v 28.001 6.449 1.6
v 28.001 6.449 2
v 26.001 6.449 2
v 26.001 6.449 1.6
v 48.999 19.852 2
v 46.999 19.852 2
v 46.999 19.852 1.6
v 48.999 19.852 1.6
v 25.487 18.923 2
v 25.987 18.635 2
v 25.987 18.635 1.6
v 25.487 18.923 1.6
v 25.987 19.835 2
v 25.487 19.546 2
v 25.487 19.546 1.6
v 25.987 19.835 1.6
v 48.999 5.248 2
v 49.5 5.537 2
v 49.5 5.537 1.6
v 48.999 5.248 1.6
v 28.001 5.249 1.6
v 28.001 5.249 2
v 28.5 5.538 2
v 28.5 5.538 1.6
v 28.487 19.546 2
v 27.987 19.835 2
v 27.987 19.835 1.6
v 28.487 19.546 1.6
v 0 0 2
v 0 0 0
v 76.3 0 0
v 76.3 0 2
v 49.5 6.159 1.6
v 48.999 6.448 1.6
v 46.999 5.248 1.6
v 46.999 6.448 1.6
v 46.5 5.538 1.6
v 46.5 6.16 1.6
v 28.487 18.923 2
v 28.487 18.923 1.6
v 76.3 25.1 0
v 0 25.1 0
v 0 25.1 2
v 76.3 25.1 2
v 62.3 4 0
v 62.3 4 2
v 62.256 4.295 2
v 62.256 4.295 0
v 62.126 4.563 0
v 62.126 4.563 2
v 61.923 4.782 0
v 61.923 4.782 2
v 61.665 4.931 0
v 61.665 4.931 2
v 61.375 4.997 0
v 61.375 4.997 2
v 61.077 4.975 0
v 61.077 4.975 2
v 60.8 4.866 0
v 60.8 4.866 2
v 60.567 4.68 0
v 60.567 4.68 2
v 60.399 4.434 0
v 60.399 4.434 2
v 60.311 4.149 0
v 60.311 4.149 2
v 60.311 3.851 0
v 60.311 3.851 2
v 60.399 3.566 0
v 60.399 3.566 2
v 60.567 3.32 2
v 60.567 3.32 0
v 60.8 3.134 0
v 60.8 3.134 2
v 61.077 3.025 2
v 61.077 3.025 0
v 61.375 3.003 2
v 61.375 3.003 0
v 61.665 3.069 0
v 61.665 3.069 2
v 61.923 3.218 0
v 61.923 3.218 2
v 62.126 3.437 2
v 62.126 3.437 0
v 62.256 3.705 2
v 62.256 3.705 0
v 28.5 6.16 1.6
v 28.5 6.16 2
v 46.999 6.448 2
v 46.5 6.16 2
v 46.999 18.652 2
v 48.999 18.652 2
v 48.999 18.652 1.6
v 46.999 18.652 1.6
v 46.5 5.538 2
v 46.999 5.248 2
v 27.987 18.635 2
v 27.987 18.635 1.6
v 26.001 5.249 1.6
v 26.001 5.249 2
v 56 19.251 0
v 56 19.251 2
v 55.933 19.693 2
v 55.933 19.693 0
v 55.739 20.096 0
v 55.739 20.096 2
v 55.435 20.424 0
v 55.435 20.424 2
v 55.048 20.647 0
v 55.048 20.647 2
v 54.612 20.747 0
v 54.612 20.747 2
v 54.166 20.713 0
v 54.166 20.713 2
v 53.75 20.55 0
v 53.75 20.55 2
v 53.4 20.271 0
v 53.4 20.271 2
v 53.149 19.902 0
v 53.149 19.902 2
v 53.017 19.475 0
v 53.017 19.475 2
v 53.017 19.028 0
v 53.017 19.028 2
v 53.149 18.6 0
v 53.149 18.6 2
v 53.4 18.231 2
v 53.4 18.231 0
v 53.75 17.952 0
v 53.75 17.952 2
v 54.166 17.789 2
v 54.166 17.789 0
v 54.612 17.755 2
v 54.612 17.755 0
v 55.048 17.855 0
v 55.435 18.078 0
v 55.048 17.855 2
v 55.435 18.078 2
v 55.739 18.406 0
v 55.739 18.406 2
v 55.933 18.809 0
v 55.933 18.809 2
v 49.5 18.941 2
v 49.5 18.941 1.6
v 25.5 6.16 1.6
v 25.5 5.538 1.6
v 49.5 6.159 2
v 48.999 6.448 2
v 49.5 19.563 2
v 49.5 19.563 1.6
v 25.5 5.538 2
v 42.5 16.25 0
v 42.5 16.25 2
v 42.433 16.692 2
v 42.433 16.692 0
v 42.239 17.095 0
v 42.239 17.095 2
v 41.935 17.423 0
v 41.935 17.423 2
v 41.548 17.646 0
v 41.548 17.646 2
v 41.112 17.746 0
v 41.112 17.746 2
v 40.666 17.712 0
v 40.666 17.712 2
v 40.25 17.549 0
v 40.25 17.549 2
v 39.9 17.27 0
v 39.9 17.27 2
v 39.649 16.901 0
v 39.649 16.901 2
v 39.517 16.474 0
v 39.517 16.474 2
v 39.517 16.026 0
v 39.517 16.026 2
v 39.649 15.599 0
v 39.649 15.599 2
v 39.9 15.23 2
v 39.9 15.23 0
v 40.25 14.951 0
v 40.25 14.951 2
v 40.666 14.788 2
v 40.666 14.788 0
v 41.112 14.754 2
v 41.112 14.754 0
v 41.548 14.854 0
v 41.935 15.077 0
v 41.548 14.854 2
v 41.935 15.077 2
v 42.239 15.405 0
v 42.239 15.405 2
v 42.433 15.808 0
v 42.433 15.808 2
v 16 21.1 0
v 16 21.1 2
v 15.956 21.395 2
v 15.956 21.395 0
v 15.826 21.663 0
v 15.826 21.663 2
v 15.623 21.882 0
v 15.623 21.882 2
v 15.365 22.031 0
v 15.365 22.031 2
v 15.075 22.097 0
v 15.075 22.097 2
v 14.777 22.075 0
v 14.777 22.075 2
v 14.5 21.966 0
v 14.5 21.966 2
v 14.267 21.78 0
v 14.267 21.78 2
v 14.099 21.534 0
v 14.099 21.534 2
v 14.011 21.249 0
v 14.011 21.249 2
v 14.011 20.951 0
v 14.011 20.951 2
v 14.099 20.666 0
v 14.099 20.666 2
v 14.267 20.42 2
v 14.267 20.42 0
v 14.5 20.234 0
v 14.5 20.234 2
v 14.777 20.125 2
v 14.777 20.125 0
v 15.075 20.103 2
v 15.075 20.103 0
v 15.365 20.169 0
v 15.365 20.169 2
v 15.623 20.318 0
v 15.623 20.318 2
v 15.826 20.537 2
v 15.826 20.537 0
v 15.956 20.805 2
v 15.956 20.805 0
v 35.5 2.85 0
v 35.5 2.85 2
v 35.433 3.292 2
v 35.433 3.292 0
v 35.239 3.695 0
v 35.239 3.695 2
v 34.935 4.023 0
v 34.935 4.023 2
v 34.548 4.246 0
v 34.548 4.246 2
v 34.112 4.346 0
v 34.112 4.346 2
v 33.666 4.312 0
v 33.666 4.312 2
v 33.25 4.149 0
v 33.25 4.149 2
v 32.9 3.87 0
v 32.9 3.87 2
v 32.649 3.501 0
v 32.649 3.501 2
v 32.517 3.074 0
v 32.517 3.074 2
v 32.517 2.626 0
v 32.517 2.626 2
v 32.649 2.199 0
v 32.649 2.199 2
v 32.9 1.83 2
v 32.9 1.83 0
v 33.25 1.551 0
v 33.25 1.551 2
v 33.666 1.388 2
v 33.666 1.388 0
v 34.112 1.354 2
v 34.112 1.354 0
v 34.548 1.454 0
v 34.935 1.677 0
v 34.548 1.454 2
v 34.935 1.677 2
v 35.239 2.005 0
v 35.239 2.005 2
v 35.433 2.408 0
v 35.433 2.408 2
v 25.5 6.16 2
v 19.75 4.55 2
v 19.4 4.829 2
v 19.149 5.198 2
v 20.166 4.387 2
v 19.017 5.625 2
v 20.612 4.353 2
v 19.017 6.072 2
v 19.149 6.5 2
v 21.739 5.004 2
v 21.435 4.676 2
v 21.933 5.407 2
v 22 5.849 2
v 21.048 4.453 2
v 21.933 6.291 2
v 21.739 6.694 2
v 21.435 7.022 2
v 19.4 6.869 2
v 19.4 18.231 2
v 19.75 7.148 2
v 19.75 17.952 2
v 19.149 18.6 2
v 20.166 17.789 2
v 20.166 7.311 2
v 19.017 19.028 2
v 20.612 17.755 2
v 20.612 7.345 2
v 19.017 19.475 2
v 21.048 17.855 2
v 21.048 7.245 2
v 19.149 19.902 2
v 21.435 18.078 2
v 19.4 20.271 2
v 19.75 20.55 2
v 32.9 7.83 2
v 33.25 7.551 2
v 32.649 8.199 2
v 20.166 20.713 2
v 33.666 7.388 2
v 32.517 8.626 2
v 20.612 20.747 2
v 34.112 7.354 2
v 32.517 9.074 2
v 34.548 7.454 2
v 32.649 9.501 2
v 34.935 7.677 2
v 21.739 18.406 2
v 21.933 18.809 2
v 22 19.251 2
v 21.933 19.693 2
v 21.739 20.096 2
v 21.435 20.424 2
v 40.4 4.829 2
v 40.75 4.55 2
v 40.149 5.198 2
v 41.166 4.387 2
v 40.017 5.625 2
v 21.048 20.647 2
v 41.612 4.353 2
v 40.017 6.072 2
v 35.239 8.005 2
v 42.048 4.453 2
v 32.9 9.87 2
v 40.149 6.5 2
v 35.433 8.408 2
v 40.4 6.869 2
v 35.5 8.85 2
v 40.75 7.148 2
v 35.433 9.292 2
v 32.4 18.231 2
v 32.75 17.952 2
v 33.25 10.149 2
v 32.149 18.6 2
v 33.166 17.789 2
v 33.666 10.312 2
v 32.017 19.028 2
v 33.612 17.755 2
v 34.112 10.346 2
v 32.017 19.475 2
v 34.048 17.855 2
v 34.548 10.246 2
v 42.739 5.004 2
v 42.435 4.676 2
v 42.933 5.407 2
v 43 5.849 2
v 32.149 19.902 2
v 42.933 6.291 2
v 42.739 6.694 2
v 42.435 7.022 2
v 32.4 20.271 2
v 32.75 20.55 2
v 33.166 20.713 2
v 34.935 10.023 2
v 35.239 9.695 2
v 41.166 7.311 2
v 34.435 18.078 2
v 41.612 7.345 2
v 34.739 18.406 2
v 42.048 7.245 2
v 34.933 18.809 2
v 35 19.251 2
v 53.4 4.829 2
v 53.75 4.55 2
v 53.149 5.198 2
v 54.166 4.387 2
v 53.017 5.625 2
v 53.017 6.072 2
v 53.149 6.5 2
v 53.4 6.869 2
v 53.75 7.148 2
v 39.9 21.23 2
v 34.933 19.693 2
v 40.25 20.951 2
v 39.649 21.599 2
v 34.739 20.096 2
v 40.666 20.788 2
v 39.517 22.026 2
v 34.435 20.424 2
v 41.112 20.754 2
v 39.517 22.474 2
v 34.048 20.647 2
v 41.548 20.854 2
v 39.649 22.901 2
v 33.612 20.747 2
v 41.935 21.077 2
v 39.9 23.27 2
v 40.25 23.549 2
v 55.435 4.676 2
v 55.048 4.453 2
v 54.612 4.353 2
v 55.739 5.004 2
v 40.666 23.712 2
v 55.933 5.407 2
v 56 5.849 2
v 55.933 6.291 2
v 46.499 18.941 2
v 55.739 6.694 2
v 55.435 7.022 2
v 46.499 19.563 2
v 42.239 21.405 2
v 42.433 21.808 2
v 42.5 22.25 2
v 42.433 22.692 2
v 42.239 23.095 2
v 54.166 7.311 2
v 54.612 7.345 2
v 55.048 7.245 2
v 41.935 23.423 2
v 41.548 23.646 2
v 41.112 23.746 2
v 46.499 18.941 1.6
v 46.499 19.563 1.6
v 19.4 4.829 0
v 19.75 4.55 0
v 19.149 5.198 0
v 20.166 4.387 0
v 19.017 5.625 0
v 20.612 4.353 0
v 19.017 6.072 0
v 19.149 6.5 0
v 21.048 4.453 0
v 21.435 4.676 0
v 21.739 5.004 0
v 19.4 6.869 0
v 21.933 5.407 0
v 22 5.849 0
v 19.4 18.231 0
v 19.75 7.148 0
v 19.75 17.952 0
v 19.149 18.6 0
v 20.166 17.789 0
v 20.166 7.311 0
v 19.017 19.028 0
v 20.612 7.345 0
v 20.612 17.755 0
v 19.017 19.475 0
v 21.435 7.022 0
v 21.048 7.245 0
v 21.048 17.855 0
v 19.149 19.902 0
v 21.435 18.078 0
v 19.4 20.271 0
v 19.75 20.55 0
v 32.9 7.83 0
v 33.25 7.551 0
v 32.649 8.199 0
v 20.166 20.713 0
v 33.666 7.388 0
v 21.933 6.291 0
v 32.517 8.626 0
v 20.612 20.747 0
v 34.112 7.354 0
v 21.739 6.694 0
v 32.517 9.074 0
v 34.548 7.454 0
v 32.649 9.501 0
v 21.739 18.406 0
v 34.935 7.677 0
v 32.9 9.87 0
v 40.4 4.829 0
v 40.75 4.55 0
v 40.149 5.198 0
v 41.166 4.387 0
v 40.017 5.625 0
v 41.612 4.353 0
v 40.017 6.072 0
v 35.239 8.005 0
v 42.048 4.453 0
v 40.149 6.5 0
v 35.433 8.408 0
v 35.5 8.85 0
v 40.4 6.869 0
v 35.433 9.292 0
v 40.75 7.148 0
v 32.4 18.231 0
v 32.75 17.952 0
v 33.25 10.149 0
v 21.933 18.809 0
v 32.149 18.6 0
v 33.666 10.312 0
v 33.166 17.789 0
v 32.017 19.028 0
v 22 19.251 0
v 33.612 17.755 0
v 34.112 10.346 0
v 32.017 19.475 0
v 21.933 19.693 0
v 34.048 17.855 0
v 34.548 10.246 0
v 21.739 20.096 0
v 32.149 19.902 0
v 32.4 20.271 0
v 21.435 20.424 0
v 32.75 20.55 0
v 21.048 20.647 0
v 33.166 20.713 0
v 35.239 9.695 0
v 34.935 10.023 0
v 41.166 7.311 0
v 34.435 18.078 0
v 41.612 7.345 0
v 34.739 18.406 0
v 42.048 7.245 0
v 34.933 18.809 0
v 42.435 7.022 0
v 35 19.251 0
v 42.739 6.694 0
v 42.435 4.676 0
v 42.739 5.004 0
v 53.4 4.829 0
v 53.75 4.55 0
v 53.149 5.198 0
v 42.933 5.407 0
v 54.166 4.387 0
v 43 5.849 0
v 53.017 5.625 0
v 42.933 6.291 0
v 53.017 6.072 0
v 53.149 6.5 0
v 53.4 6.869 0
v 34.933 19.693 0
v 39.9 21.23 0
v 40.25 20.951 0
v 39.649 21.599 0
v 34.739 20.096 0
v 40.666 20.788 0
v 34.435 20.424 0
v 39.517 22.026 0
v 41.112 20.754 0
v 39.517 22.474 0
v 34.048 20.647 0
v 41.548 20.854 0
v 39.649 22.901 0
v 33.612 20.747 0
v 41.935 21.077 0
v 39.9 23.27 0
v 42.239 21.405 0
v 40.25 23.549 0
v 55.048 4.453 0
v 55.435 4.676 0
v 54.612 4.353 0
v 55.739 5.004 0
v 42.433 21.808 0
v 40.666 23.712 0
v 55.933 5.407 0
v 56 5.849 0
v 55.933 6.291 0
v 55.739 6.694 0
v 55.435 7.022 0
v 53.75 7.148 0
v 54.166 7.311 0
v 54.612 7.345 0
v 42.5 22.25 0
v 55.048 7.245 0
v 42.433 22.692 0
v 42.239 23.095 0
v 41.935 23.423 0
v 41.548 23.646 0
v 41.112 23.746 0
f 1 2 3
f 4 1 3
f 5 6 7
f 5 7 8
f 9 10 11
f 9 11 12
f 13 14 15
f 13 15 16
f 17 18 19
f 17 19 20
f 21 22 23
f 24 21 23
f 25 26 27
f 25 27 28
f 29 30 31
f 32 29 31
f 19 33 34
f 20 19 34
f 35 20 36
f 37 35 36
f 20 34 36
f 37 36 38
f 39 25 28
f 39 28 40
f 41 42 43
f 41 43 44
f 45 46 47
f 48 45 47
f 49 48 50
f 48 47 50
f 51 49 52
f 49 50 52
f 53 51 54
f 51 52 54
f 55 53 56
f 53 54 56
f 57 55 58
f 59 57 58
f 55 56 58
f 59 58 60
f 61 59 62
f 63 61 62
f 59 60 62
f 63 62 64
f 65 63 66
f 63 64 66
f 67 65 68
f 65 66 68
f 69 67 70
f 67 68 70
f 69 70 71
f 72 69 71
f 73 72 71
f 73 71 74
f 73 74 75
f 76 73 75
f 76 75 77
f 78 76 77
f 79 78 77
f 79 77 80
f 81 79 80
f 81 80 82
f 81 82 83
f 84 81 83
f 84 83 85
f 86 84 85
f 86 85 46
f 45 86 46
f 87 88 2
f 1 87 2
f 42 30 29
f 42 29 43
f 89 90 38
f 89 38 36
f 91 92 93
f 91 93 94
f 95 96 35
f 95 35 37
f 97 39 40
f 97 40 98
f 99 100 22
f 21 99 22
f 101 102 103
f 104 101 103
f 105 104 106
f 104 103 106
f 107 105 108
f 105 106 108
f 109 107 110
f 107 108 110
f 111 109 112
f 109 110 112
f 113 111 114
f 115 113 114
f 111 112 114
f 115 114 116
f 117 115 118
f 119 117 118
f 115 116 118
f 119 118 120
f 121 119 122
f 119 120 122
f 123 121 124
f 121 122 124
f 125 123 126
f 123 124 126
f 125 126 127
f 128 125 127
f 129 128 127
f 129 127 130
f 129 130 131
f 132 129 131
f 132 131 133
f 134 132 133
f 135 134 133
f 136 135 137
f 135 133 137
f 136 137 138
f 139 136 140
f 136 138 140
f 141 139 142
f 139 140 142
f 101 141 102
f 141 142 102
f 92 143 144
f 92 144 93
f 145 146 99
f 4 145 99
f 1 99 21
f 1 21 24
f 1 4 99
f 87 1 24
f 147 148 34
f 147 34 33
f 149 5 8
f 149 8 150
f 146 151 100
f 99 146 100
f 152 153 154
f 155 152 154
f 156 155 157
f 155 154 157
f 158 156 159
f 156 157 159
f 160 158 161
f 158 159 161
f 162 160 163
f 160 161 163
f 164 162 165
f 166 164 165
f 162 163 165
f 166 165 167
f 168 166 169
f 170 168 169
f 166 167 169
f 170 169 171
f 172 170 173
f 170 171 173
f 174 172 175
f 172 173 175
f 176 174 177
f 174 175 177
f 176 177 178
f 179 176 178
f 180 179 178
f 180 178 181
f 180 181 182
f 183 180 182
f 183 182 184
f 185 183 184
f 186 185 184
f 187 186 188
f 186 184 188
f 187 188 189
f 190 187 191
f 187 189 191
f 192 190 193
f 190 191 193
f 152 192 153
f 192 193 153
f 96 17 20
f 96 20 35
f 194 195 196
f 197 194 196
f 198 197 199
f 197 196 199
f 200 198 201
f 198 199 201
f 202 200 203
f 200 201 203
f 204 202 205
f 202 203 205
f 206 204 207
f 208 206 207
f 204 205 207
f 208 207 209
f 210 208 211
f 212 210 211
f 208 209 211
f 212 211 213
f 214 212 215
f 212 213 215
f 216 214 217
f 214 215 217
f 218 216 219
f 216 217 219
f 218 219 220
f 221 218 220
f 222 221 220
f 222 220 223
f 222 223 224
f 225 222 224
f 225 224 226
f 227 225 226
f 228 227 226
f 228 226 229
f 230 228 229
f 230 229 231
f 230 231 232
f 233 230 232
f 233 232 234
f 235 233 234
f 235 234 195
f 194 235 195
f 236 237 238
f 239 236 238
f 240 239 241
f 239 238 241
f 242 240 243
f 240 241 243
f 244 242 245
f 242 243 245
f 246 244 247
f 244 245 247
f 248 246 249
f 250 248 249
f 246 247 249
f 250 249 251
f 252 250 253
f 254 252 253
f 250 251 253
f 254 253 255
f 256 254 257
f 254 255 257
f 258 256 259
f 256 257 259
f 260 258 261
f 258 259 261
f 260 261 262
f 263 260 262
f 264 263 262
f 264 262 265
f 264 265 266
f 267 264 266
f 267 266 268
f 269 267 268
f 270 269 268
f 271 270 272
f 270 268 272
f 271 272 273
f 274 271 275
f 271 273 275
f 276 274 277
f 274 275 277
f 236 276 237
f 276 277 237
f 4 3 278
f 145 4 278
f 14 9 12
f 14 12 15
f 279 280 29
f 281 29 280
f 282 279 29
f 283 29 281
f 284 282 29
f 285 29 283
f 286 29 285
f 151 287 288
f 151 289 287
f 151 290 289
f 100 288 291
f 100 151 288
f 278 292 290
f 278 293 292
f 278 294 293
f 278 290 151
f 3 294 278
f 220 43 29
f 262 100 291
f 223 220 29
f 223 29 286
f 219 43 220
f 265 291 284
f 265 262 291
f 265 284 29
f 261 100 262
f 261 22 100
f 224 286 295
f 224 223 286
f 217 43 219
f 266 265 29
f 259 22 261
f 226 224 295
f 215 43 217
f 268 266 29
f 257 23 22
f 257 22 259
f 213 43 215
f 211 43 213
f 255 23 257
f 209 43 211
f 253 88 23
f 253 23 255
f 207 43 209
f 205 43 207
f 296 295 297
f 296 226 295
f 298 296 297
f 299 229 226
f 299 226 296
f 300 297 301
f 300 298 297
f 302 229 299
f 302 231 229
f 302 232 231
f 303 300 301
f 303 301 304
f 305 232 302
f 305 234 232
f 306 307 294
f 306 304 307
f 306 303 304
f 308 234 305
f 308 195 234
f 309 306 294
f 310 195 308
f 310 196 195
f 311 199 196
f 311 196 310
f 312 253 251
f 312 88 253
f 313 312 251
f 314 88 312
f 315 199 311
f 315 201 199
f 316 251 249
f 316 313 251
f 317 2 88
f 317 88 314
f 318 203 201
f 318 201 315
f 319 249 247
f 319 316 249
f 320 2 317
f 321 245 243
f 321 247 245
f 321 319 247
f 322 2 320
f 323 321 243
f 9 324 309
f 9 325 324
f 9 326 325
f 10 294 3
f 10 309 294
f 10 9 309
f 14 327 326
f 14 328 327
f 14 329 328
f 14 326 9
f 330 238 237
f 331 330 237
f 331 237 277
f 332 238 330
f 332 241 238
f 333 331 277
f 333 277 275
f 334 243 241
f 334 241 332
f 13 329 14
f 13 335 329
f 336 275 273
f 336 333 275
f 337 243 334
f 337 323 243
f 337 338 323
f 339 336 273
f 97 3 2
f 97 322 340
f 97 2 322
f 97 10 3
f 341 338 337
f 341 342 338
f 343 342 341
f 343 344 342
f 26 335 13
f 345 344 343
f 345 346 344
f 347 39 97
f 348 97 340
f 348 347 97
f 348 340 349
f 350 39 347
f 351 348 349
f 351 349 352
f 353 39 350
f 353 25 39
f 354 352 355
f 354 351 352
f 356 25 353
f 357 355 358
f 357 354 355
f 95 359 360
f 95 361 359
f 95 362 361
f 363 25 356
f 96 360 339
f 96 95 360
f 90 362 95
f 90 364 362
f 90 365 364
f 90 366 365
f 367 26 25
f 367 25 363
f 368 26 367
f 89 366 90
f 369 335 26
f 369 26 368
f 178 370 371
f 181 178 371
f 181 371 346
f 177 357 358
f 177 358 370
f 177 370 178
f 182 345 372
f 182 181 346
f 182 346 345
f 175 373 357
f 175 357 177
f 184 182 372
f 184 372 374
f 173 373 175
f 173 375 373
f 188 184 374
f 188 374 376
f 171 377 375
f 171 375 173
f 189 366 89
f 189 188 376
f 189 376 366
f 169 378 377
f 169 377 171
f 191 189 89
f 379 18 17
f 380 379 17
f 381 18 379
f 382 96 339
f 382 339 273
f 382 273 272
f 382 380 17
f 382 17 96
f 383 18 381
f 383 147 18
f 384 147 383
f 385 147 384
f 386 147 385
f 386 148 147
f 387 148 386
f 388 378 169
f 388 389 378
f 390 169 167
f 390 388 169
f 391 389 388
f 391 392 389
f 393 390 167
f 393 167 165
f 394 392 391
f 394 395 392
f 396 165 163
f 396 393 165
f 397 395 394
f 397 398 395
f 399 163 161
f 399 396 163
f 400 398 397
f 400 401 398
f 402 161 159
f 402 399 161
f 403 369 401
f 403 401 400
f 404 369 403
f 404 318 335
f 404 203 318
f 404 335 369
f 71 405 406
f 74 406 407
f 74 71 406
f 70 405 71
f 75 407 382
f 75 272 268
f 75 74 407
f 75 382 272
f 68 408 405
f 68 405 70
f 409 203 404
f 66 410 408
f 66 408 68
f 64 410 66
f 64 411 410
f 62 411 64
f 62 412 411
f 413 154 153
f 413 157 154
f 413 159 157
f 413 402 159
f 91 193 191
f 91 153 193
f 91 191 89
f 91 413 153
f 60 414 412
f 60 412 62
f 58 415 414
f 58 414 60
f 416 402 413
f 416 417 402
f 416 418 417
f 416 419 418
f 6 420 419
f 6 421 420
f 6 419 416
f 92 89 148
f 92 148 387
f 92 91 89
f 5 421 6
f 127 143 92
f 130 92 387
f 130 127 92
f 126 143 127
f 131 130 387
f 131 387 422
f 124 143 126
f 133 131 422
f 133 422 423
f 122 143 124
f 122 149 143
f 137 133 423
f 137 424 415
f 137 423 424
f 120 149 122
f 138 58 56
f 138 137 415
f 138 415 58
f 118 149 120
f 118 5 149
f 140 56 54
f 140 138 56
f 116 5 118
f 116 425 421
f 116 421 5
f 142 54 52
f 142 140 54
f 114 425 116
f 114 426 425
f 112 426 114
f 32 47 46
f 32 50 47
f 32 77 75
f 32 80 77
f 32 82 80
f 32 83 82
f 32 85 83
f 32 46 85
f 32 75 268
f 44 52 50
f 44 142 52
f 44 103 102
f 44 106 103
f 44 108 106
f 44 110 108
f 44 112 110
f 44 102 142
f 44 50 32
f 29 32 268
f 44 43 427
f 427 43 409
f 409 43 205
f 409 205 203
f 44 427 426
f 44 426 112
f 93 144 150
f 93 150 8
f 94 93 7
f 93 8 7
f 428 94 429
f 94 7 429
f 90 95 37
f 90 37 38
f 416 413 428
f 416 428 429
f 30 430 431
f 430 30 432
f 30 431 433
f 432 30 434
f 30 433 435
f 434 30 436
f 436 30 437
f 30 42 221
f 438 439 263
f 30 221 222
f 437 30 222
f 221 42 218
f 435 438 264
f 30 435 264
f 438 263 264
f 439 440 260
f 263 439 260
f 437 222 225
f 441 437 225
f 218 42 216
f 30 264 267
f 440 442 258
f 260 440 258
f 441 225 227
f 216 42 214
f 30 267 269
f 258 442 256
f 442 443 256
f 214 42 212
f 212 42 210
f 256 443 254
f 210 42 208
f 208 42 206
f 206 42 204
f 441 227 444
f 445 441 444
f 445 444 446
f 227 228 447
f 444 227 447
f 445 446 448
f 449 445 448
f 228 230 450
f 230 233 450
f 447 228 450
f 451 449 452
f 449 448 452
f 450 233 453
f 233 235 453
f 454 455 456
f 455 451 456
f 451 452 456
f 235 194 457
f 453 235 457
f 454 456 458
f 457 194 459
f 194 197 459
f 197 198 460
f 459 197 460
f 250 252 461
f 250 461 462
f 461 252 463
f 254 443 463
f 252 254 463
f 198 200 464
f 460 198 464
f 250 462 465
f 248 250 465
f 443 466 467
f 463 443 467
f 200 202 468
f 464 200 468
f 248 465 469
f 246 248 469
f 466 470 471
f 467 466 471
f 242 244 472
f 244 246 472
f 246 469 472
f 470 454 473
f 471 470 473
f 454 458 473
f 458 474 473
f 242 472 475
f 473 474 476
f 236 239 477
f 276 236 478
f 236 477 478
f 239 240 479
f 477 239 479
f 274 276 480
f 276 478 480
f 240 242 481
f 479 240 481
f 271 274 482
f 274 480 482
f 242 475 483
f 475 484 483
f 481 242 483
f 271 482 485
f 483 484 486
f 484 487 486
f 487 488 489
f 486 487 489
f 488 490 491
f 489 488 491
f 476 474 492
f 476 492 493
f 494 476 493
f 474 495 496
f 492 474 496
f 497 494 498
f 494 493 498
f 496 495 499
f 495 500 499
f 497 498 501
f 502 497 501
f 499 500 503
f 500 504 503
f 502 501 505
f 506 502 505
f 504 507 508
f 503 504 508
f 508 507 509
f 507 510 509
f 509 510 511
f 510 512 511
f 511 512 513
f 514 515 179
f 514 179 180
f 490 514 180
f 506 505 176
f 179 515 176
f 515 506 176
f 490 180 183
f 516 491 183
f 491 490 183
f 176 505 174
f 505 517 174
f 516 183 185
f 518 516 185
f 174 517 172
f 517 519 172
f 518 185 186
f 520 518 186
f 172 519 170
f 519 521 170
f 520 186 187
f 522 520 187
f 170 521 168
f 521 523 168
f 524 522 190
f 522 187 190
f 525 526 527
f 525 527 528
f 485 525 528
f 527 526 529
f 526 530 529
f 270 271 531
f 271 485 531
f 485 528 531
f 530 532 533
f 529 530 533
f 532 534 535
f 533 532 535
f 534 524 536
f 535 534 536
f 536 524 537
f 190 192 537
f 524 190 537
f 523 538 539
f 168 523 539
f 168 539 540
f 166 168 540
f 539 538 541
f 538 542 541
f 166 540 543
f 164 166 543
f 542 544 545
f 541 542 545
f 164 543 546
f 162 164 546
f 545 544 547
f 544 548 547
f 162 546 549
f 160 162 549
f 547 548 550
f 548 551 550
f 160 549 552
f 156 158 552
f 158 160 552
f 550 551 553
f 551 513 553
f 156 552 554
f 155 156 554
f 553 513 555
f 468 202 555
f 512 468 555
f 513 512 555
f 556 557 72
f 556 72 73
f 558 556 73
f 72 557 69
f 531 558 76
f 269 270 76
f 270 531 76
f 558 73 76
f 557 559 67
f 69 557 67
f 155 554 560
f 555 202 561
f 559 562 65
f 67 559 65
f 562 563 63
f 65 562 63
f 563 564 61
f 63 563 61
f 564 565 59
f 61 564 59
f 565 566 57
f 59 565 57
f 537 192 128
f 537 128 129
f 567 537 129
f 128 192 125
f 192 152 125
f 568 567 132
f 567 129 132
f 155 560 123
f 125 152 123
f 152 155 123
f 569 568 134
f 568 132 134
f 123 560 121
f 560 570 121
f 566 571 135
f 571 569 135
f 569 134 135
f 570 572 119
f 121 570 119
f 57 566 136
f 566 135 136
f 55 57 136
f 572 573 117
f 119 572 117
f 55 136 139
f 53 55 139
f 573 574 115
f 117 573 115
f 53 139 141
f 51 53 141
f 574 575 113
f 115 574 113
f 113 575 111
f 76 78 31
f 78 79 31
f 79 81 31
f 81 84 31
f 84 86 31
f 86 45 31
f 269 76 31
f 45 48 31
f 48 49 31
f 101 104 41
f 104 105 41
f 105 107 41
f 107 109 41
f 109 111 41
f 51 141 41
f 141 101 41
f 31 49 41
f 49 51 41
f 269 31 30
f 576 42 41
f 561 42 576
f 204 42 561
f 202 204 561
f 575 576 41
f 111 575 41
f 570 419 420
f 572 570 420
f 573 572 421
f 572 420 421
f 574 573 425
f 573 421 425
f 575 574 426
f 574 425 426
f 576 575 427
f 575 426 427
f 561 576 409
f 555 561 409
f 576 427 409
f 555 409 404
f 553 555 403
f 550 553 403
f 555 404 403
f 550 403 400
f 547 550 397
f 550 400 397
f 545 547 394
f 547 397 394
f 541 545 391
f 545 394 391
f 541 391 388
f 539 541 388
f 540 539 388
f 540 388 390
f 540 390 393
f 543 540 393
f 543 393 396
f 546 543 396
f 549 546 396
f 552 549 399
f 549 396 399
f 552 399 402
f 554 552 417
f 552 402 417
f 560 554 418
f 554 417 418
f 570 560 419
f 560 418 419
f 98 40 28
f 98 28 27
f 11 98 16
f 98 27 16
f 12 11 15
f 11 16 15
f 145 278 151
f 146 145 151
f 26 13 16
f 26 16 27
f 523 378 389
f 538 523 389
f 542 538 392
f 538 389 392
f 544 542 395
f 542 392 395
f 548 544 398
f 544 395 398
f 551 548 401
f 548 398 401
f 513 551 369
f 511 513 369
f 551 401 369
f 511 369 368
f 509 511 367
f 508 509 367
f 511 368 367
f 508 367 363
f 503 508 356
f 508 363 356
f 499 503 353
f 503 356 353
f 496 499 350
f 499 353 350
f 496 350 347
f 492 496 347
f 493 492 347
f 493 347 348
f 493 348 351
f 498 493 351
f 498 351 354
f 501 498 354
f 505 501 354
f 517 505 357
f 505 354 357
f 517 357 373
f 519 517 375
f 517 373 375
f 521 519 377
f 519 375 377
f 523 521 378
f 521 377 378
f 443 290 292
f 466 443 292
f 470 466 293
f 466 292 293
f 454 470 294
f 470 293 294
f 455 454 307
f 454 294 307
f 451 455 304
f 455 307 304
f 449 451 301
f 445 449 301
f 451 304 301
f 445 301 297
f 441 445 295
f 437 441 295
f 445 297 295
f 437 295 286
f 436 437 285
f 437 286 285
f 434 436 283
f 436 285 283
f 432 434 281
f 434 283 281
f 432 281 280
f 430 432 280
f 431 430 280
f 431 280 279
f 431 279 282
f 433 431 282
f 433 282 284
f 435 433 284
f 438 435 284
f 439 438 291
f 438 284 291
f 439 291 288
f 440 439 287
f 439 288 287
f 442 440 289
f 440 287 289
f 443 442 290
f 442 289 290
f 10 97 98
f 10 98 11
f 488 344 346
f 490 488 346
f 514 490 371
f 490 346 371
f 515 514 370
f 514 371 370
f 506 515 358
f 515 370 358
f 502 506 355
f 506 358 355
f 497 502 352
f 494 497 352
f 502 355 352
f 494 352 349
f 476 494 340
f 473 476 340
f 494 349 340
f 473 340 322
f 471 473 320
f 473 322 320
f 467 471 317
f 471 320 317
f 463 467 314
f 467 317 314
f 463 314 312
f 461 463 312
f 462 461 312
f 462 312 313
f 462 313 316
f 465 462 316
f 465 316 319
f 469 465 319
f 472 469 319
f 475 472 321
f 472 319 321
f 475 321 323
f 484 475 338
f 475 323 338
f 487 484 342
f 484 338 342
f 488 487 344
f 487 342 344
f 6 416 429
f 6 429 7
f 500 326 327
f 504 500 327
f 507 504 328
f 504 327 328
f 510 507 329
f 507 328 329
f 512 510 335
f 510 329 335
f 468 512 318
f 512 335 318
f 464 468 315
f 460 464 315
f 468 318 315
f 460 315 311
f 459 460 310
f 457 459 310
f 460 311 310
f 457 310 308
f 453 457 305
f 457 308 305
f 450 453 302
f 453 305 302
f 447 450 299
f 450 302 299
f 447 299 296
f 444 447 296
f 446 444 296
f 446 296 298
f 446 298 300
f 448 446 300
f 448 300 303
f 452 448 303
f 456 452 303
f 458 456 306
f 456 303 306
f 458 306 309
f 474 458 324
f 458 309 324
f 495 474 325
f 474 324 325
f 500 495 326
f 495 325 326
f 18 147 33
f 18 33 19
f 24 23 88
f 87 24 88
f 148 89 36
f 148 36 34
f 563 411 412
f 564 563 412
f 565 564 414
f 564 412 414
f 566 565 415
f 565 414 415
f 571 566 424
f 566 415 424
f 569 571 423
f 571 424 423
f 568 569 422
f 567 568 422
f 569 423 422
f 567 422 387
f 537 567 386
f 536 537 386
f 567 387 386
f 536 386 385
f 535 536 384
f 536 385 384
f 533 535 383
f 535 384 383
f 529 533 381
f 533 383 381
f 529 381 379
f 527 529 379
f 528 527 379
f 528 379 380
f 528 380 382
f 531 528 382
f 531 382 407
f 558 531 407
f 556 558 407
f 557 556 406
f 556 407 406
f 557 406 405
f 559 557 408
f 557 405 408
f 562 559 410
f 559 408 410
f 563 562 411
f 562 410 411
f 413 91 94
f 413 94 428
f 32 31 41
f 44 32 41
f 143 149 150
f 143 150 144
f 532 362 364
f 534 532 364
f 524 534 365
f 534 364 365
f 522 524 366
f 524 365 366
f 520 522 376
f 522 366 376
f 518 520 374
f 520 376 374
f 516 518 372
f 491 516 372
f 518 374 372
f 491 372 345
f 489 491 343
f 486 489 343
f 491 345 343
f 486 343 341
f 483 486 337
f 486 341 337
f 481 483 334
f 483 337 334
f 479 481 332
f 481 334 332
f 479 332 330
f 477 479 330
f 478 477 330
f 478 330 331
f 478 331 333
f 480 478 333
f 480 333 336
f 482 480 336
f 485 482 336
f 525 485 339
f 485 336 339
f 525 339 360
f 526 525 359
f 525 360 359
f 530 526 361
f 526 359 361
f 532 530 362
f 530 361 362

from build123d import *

# Parameters (mm, degrees)
SKETCH1_W           = 76.3
SKETCH1_H           = 25.1
BOSS_EXTRUDE1_DEPTH = 2
SKETCH3_R           = 1
CUT_EXTRUDE2_DEPTH  = 10
SKETCH10_R          = 1.5
CUT_EXTRUDE8_DEPTH  = 2
CUT_EXTRUDE10_DEPTH = 0.4


with BuildPart() as part:
    # Sketch1 → Boss-Extrude1 (new body)
    with BuildSketch(Plane.XY):
        with Locations((38.15, 12.55)):
            Rectangle(SKETCH1_W, SKETCH1_H)
    extrude(amount=BOSS_EXTRUDE1_DEPTH)

    # Sketch3 → Cut-Extrude2 (cut)
    with BuildSketch(Plane.XY.offset(2)):
        with Locations((15, 21.1)):
            Circle(SKETCH3_R)
        with Locations((61.3, 4)):
            Circle(SKETCH3_R)
    extrude(amount=-CUT_EXTRUDE2_DEPTH, mode=Mode.SUBTRACT)

    # Sketch10 → Cut-Extrude8 (cut)
    with BuildSketch(Plane.XY.offset(2)):
        with Locations((20.5, 19.25108338)):
            Circle(SKETCH10_R)
        with Locations((20.5, 5.84891662)):
            Circle(SKETCH10_R)
        with Locations((54.5, 5.84891662)):
            Circle(SKETCH10_R)
        with Locations((54.5, 19.25108338)):
            Circle(SKETCH10_R)
        with Locations((33.5, 19.25108338)):
            Circle(SKETCH10_R)
        with Locations((41.5, 5.84891662)):
            Circle(SKETCH10_R)
        with Locations((34, 2.85)):
            Circle(SKETCH10_R)
        with Locations((34, 8.85)):
            Circle(SKETCH10_R)
        with Locations((41, 22.25)):
            Circle(SKETCH10_R)
        with Locations((41, 16.25)):
            Circle(SKETCH10_R)
    extrude(amount=-CUT_EXTRUDE8_DEPTH, mode=Mode.SUBTRACT)

    # Sketch12 → Cut-Extrude10 (cut)
    with BuildSketch(Plane.XY.offset(2)):
        Polygon((25.986752225, 19.834512657), (27.986752225, 19.834512657), (28.486752225, 19.545837522), (28.486752225, 18.923187791), (27.986752225, 18.634512657), (25.986752225, 18.634512657), (25.486752225, 18.923187791), (25.486752225, 19.545837522), align=None)
        Polygon((49.5, 6.15891662), (49.5, 5.53691662), (48.999437317, 5.24791662), (46.999437317, 5.24791662), (46.5, 5.537566351), (46.5, 6.159566351), (46.999437317, 6.44791662), (48.999437317, 6.44791662), align=None)
        Polygon((25.5, 6.159566351), (25.5, 5.537566351), (26.000562683, 5.248566351), (28.000562683, 5.248566351), (28.5, 5.537566351), (28.5, 6.160216081), (28.000562683, 6.448566351), (26.000562683, 6.448566351), align=None)
        Polygon((49.5, 19.56308338), (49.5, 18.94108338), (48.999437317, 18.65208338), (46.999437317, 18.65208338), (46.498874633, 18.94108338), (46.498874633, 19.56308338), (46.999437317, 19.85208338), (48.999437317, 19.85208338), align=None)
    extrude(amount=-CUT_EXTRUDE10_DEPTH, mode=Mode.SUBTRACT)


solid = part.part
